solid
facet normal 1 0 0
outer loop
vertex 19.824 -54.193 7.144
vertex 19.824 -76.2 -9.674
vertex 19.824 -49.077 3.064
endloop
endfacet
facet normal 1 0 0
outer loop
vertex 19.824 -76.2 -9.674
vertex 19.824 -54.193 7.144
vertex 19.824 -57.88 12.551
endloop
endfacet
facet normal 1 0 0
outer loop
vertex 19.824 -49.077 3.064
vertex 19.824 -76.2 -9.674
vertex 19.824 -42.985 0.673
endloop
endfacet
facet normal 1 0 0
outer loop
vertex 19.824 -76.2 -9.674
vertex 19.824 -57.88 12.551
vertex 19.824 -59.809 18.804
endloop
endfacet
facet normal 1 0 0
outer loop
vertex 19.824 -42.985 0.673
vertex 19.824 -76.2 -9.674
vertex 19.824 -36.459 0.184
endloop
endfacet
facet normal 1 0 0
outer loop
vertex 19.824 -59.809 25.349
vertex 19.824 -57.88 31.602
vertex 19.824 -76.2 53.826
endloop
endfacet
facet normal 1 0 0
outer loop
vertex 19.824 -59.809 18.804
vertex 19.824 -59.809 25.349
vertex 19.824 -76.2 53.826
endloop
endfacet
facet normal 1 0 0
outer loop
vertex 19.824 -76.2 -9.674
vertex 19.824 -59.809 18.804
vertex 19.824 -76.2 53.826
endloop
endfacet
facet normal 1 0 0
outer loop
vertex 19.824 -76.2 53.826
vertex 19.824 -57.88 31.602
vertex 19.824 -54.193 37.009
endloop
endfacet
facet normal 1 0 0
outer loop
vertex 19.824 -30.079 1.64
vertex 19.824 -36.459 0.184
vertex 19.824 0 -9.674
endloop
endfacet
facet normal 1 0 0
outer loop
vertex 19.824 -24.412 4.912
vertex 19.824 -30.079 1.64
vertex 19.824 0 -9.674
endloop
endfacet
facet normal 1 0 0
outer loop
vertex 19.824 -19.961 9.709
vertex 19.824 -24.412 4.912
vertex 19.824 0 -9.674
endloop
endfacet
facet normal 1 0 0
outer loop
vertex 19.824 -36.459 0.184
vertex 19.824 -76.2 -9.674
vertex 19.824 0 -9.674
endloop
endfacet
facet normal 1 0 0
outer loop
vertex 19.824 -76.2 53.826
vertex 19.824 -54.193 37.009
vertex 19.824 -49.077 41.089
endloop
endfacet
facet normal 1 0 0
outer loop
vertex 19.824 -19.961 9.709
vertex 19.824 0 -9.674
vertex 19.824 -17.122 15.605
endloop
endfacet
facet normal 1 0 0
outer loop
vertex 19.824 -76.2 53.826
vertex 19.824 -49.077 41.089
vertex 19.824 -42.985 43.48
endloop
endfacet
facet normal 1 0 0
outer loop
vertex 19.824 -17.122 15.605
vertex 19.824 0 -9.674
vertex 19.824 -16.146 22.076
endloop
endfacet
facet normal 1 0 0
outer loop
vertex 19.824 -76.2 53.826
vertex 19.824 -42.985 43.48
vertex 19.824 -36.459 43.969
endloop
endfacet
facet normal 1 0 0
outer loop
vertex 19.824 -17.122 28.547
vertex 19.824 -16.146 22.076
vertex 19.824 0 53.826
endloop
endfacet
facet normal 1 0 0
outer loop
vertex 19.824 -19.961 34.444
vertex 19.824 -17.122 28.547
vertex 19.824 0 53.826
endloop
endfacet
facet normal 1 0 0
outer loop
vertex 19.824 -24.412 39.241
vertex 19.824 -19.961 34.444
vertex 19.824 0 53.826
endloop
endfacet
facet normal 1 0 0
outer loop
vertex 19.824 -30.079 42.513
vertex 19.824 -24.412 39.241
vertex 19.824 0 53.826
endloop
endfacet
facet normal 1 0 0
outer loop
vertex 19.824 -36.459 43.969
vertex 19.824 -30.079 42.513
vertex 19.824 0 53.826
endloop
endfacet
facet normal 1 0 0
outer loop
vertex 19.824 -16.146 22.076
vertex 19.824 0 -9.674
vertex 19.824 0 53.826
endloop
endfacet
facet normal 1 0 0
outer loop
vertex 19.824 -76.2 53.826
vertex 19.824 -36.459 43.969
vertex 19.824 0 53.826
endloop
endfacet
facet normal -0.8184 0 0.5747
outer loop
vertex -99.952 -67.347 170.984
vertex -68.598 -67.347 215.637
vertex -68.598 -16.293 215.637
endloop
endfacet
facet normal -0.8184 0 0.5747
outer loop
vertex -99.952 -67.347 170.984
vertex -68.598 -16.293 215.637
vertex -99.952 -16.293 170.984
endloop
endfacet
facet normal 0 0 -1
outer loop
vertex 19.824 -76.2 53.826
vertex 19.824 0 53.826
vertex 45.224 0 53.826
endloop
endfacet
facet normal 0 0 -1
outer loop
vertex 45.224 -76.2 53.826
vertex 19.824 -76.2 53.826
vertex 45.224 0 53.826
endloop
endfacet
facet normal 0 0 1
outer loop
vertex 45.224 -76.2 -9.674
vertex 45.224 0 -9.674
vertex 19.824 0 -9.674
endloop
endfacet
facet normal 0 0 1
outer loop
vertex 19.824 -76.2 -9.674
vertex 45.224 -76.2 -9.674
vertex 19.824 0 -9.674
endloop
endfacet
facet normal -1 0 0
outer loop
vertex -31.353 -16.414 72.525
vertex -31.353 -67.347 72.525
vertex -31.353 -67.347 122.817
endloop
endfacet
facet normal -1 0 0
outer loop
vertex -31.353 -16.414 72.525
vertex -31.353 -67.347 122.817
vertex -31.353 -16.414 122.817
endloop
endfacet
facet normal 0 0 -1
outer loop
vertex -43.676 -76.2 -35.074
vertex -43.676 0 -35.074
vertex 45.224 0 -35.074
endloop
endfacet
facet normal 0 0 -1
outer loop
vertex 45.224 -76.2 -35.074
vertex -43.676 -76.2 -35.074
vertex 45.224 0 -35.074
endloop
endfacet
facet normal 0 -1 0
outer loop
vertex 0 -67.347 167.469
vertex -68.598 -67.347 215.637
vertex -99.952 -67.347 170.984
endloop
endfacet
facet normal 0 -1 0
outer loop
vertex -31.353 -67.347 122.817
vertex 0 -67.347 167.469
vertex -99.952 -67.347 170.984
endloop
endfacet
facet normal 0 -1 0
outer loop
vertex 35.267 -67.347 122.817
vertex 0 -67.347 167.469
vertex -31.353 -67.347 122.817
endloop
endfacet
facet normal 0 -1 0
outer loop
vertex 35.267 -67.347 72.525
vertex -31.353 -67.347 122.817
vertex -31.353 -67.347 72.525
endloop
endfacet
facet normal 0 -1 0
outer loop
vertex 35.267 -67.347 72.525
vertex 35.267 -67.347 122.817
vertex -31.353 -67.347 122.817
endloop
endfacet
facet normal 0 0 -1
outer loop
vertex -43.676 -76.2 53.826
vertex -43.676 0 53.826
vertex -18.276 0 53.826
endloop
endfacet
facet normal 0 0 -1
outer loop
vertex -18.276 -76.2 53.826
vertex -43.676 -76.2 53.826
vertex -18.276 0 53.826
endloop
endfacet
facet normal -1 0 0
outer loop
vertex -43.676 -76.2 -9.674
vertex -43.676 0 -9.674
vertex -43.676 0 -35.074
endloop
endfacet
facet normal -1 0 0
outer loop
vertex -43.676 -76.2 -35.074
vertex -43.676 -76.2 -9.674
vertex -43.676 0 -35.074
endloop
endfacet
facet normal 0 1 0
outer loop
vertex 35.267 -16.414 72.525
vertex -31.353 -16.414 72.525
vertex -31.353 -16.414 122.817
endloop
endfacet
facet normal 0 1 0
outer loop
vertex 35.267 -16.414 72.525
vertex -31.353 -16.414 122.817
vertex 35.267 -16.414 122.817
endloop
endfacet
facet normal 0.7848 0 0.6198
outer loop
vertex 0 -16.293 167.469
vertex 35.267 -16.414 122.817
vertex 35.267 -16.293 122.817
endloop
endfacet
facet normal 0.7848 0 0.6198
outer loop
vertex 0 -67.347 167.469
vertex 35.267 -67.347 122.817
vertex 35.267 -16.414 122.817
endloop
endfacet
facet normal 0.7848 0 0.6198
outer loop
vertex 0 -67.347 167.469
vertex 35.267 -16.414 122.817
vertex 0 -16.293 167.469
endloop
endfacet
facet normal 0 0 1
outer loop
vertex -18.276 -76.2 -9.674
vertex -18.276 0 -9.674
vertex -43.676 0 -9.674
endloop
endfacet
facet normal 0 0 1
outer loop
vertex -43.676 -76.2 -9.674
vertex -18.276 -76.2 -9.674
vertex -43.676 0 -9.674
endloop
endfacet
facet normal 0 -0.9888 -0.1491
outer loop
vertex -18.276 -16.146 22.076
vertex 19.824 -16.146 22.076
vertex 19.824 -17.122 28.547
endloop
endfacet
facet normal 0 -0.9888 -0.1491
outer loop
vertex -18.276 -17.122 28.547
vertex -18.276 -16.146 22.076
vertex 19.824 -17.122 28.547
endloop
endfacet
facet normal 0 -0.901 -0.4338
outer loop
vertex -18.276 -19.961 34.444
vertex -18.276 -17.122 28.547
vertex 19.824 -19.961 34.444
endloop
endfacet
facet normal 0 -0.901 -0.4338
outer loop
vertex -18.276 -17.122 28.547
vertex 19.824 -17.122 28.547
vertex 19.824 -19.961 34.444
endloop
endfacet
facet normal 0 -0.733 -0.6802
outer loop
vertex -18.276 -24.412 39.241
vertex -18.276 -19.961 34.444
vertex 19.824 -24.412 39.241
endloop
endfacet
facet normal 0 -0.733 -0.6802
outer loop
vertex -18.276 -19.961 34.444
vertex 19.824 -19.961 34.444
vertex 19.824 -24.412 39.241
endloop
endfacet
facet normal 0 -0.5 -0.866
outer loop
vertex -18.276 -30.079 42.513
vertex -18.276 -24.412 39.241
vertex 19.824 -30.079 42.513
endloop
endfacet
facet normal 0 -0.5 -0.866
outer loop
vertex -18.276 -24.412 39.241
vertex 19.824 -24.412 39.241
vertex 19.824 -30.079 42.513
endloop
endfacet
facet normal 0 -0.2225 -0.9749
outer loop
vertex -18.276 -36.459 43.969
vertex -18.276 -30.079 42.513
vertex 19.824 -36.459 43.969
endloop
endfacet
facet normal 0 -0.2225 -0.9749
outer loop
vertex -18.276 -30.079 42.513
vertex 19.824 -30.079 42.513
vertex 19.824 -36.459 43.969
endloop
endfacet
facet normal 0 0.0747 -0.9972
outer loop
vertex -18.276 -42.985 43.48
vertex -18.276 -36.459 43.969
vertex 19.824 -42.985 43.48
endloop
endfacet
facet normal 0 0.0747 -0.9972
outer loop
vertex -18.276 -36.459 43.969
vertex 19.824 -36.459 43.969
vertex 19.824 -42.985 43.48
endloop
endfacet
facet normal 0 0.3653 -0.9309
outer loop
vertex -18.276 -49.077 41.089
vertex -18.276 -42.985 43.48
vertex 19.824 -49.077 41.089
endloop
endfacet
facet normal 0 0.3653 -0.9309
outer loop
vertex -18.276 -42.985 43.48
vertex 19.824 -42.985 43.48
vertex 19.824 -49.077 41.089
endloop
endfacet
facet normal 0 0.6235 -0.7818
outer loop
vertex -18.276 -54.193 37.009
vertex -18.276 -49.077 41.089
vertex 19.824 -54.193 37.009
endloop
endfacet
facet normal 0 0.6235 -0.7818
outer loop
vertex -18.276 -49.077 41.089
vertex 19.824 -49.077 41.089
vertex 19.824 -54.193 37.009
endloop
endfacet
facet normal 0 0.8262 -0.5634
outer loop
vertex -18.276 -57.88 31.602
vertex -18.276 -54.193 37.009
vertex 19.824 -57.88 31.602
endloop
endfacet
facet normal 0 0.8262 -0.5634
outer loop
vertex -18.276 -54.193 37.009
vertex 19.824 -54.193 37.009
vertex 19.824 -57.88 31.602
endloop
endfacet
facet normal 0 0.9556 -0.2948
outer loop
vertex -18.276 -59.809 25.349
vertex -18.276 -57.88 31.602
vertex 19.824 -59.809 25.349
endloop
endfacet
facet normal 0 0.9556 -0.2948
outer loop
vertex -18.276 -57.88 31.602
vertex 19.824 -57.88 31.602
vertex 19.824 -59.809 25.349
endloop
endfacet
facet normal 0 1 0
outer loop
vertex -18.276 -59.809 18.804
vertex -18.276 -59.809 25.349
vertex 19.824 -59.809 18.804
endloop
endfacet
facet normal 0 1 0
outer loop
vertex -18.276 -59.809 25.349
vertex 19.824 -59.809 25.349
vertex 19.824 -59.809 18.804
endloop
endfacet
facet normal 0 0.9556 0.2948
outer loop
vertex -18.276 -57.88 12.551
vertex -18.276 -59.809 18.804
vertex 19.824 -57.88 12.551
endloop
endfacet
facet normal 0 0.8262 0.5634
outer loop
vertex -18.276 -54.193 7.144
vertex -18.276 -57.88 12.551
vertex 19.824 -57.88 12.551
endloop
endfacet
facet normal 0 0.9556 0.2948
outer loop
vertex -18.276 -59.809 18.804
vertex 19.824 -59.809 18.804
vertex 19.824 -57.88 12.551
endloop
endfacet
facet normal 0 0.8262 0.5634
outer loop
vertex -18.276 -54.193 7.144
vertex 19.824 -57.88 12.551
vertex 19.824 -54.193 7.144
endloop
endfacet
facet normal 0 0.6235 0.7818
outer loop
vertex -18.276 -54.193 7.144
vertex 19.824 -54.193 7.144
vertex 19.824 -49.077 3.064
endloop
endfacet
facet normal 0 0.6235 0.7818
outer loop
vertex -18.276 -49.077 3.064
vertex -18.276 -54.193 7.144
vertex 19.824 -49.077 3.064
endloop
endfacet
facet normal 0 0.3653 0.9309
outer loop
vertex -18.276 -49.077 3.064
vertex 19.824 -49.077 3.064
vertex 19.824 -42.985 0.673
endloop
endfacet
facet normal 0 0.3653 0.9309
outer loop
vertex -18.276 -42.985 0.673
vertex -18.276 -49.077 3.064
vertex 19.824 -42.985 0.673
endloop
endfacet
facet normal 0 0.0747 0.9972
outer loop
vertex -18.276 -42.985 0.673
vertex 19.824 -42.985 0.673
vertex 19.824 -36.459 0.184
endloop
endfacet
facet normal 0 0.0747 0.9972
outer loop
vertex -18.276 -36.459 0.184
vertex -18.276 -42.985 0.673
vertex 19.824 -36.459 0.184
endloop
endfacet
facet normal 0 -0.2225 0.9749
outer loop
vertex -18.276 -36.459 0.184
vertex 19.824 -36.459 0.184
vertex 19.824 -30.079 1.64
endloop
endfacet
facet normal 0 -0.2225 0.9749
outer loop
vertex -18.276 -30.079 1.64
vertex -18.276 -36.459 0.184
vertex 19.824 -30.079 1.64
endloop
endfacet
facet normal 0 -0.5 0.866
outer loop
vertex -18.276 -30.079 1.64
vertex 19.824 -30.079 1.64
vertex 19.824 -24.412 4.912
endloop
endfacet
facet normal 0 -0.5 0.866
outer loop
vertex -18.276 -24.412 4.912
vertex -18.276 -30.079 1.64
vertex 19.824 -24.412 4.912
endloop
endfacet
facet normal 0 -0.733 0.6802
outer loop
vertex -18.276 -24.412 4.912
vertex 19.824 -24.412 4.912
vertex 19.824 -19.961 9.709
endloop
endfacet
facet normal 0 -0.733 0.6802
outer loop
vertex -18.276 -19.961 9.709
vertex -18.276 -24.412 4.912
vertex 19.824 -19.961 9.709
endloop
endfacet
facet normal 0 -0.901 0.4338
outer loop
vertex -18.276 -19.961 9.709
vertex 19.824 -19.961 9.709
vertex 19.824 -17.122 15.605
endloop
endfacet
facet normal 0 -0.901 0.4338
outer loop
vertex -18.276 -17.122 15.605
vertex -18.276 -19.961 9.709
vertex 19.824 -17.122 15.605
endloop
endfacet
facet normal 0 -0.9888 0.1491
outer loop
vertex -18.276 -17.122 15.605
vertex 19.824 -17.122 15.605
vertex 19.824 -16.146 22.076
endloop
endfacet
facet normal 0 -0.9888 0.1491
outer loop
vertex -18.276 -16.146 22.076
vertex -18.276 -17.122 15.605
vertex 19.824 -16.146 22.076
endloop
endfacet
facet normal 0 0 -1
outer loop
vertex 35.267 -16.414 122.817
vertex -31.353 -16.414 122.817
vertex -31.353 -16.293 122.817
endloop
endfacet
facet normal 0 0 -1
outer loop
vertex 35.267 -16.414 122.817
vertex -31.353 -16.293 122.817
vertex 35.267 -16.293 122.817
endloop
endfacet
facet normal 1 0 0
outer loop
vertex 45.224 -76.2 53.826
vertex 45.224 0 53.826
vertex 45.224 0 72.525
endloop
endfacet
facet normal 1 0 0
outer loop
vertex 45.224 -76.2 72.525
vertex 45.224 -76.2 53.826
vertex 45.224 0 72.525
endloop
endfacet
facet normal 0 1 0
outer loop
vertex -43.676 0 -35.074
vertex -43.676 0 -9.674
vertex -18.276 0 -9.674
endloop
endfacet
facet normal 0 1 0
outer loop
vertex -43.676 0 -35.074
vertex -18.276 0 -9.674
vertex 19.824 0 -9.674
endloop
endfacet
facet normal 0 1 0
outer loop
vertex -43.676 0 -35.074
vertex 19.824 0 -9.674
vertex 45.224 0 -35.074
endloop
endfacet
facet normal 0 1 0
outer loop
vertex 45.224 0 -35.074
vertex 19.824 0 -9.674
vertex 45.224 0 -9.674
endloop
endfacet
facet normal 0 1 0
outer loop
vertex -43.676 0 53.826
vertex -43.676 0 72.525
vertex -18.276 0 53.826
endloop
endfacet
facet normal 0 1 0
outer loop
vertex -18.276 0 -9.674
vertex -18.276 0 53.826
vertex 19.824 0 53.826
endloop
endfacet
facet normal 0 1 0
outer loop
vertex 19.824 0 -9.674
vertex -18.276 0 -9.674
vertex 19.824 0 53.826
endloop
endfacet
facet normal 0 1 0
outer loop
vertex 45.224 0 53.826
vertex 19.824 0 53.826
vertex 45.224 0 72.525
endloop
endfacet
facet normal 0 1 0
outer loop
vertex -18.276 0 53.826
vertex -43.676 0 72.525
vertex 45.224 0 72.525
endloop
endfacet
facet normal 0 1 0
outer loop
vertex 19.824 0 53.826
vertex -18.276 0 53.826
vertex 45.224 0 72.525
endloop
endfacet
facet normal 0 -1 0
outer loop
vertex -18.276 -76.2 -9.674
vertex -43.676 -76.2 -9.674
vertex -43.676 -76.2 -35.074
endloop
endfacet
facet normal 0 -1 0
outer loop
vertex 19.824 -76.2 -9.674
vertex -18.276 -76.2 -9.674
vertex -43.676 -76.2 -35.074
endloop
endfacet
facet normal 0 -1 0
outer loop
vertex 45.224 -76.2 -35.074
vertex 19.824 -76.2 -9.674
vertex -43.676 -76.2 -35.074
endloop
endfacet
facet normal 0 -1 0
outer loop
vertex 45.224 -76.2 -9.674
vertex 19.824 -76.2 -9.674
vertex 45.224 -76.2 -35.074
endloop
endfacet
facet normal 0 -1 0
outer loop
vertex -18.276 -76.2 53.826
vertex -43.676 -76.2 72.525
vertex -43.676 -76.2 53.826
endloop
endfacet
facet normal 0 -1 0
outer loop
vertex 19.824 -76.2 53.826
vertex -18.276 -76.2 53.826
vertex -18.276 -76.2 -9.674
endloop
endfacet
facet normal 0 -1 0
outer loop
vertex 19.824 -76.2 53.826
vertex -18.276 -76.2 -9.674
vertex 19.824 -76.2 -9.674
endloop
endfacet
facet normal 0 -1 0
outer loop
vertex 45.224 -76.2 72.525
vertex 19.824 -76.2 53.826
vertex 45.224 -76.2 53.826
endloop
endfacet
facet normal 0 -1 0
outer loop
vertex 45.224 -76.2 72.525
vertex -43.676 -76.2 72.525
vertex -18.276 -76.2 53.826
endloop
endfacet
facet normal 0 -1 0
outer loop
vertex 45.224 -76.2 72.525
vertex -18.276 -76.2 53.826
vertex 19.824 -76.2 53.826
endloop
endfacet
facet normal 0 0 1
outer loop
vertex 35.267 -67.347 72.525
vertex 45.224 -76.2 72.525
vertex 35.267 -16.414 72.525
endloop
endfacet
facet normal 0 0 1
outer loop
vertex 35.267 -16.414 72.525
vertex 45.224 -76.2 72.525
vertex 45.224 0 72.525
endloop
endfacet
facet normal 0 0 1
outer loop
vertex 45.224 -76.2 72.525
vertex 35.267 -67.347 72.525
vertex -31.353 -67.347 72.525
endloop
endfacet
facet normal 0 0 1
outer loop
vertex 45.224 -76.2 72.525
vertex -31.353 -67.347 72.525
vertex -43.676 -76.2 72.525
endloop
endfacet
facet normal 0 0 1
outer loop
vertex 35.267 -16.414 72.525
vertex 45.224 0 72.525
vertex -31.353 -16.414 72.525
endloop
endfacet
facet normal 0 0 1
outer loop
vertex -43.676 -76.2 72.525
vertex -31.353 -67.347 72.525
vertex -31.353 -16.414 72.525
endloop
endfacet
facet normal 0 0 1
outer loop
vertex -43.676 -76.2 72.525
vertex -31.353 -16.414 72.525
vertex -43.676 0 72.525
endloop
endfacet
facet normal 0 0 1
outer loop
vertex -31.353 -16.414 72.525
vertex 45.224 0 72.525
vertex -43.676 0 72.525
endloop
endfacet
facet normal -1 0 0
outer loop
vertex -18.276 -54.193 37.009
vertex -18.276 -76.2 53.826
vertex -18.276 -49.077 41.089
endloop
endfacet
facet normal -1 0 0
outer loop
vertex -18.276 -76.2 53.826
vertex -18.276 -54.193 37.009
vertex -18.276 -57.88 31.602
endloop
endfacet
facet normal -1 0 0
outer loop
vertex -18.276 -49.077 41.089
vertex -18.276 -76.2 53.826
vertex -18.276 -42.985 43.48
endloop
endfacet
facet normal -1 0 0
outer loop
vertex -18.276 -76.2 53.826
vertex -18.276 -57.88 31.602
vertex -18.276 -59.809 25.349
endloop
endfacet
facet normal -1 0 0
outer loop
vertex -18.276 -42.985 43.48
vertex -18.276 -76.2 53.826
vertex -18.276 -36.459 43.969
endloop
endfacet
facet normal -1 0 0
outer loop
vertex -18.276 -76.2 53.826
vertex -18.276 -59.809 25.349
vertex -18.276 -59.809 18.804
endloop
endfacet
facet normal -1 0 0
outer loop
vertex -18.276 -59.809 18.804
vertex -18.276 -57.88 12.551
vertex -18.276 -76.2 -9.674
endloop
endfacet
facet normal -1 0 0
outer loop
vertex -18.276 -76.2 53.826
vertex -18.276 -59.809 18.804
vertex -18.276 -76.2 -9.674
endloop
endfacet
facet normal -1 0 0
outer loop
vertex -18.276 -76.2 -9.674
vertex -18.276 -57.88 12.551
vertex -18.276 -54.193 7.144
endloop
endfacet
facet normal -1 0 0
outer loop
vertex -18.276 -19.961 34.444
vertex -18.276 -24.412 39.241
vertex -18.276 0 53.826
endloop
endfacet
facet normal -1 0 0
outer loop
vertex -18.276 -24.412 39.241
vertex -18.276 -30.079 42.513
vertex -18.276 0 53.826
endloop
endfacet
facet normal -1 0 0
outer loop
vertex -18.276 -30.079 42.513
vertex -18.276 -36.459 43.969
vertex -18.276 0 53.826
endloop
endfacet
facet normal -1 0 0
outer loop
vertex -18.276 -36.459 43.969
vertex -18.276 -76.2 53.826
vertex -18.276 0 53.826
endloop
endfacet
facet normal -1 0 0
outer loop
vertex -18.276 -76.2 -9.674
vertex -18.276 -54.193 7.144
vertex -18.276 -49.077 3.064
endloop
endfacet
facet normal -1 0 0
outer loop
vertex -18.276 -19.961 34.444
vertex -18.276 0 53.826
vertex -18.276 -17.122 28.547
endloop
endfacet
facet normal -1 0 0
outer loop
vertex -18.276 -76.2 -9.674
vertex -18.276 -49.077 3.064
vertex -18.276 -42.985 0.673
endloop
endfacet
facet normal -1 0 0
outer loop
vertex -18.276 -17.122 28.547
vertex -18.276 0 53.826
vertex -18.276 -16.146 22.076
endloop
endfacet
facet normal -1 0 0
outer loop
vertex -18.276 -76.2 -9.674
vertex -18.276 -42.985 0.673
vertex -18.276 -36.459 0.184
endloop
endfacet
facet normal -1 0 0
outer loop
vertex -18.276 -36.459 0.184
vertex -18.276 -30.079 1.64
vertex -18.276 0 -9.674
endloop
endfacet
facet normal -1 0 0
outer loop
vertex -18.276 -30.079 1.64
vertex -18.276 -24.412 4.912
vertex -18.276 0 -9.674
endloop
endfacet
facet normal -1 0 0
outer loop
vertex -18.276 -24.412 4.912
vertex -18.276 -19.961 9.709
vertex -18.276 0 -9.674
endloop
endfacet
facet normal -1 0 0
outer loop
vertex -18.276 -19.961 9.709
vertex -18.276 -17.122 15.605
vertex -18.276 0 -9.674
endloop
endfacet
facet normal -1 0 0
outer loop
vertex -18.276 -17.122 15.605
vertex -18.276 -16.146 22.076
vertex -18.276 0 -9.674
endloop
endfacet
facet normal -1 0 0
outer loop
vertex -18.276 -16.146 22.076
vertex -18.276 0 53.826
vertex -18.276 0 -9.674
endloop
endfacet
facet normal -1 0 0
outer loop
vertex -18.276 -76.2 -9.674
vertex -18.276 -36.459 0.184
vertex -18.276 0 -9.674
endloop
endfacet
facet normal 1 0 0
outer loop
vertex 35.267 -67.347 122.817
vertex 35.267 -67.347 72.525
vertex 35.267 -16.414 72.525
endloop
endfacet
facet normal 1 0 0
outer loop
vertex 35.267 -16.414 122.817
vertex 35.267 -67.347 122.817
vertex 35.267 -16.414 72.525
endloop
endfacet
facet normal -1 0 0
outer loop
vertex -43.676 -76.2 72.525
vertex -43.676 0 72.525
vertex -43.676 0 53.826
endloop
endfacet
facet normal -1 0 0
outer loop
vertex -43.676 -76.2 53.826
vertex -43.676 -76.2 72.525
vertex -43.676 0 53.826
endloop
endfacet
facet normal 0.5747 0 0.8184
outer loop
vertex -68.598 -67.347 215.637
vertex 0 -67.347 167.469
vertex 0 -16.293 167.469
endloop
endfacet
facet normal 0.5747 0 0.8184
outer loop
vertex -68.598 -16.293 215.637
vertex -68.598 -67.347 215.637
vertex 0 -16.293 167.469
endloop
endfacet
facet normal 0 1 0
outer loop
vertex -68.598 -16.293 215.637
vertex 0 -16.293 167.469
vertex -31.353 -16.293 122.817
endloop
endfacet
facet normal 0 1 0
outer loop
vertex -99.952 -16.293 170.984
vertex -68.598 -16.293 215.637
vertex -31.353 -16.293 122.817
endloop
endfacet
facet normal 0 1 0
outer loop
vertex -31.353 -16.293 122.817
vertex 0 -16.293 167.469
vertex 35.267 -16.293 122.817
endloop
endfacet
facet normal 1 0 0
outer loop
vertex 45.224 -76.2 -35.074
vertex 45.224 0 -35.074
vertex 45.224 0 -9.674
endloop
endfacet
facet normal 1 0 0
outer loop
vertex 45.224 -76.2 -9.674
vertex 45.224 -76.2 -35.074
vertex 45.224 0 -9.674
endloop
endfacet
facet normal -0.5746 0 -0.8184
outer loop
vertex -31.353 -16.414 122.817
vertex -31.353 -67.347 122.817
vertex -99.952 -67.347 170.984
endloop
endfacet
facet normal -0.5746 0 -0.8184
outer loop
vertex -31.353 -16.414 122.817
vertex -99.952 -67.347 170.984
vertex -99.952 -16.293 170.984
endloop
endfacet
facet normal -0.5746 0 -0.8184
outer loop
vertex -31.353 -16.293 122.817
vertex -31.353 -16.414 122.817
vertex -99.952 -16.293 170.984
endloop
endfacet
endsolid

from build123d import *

# Parameters (mm, degrees)
F1_DEPTH = 76.2
F2_R     = 21.9538330402
F3_DEPTH = 63.501
F4_W     = 66.6200816631
F4_H     = 50.9327836335
F5_DEPTH = 50.292
F7_DEPTH = 51.054
F9_DEPTH = 83.82


with BuildPart() as f1:
    # F0 (on Front) → F1 (new body)
    with BuildSketch(Plane.XZ):
        Polygon((-43.6762087762, -9.6735172633), (-43.6762087762, -35.0735172633), (45.2237912238, -35.0735172633), (45.2237912238, -9.6735172633), (19.8237912238, -9.6735172633), (19.8237912238, 53.8264827367), (45.2237912238, 53.8264827367), (45.2237912238, 72.5250117484), (-43.6762087762, 72.5250117484), (-43.6762087762, 53.8264827367), (-18.2762087762, 53.8264827367), (-18.2762087762, -9.6735172633), align=None)
    extrude(amount=F1_DEPTH)

    # F2 (on face) → F3 (cut, through all)
    with BuildSketch(Plane.YZ.offset(19.8237912238)):
        with Locations((-38.1, 22.0764827367)):
            Circle(F2_R)
    extrude(amount=-F3_DEPTH, mode=Mode.SUBTRACT)

    # F4 (on face) → F5 (join)
    with BuildSketch(Plane.XY.offset(72.5250117484)):
        with Locations((1.9566230476, -41.8805312365)):
            Rectangle(F4_W, F4_H)
    extrude(amount=F5_DEPTH)

    # F6 (on face) → F7 (join)
    with BuildSketch(Plane.XZ.offset(67.3469230533)):
        Polygon((0, 167.4694269896), (-31.353417784, 122.8170117484), (35.2666638792, 122.8170117484), align=None)
    extrude(amount=-F7_DEPTH)

    # F9 (add): a face of the model
    f9_faces = [f1.faces().sort_by_distance(p)[0] for p in [
        (-15.676708892, -41.8199230533, 145.143219369),
    ]]
    extrude(f9_faces, amount=F9_DEPTH)


solid = f1.part
